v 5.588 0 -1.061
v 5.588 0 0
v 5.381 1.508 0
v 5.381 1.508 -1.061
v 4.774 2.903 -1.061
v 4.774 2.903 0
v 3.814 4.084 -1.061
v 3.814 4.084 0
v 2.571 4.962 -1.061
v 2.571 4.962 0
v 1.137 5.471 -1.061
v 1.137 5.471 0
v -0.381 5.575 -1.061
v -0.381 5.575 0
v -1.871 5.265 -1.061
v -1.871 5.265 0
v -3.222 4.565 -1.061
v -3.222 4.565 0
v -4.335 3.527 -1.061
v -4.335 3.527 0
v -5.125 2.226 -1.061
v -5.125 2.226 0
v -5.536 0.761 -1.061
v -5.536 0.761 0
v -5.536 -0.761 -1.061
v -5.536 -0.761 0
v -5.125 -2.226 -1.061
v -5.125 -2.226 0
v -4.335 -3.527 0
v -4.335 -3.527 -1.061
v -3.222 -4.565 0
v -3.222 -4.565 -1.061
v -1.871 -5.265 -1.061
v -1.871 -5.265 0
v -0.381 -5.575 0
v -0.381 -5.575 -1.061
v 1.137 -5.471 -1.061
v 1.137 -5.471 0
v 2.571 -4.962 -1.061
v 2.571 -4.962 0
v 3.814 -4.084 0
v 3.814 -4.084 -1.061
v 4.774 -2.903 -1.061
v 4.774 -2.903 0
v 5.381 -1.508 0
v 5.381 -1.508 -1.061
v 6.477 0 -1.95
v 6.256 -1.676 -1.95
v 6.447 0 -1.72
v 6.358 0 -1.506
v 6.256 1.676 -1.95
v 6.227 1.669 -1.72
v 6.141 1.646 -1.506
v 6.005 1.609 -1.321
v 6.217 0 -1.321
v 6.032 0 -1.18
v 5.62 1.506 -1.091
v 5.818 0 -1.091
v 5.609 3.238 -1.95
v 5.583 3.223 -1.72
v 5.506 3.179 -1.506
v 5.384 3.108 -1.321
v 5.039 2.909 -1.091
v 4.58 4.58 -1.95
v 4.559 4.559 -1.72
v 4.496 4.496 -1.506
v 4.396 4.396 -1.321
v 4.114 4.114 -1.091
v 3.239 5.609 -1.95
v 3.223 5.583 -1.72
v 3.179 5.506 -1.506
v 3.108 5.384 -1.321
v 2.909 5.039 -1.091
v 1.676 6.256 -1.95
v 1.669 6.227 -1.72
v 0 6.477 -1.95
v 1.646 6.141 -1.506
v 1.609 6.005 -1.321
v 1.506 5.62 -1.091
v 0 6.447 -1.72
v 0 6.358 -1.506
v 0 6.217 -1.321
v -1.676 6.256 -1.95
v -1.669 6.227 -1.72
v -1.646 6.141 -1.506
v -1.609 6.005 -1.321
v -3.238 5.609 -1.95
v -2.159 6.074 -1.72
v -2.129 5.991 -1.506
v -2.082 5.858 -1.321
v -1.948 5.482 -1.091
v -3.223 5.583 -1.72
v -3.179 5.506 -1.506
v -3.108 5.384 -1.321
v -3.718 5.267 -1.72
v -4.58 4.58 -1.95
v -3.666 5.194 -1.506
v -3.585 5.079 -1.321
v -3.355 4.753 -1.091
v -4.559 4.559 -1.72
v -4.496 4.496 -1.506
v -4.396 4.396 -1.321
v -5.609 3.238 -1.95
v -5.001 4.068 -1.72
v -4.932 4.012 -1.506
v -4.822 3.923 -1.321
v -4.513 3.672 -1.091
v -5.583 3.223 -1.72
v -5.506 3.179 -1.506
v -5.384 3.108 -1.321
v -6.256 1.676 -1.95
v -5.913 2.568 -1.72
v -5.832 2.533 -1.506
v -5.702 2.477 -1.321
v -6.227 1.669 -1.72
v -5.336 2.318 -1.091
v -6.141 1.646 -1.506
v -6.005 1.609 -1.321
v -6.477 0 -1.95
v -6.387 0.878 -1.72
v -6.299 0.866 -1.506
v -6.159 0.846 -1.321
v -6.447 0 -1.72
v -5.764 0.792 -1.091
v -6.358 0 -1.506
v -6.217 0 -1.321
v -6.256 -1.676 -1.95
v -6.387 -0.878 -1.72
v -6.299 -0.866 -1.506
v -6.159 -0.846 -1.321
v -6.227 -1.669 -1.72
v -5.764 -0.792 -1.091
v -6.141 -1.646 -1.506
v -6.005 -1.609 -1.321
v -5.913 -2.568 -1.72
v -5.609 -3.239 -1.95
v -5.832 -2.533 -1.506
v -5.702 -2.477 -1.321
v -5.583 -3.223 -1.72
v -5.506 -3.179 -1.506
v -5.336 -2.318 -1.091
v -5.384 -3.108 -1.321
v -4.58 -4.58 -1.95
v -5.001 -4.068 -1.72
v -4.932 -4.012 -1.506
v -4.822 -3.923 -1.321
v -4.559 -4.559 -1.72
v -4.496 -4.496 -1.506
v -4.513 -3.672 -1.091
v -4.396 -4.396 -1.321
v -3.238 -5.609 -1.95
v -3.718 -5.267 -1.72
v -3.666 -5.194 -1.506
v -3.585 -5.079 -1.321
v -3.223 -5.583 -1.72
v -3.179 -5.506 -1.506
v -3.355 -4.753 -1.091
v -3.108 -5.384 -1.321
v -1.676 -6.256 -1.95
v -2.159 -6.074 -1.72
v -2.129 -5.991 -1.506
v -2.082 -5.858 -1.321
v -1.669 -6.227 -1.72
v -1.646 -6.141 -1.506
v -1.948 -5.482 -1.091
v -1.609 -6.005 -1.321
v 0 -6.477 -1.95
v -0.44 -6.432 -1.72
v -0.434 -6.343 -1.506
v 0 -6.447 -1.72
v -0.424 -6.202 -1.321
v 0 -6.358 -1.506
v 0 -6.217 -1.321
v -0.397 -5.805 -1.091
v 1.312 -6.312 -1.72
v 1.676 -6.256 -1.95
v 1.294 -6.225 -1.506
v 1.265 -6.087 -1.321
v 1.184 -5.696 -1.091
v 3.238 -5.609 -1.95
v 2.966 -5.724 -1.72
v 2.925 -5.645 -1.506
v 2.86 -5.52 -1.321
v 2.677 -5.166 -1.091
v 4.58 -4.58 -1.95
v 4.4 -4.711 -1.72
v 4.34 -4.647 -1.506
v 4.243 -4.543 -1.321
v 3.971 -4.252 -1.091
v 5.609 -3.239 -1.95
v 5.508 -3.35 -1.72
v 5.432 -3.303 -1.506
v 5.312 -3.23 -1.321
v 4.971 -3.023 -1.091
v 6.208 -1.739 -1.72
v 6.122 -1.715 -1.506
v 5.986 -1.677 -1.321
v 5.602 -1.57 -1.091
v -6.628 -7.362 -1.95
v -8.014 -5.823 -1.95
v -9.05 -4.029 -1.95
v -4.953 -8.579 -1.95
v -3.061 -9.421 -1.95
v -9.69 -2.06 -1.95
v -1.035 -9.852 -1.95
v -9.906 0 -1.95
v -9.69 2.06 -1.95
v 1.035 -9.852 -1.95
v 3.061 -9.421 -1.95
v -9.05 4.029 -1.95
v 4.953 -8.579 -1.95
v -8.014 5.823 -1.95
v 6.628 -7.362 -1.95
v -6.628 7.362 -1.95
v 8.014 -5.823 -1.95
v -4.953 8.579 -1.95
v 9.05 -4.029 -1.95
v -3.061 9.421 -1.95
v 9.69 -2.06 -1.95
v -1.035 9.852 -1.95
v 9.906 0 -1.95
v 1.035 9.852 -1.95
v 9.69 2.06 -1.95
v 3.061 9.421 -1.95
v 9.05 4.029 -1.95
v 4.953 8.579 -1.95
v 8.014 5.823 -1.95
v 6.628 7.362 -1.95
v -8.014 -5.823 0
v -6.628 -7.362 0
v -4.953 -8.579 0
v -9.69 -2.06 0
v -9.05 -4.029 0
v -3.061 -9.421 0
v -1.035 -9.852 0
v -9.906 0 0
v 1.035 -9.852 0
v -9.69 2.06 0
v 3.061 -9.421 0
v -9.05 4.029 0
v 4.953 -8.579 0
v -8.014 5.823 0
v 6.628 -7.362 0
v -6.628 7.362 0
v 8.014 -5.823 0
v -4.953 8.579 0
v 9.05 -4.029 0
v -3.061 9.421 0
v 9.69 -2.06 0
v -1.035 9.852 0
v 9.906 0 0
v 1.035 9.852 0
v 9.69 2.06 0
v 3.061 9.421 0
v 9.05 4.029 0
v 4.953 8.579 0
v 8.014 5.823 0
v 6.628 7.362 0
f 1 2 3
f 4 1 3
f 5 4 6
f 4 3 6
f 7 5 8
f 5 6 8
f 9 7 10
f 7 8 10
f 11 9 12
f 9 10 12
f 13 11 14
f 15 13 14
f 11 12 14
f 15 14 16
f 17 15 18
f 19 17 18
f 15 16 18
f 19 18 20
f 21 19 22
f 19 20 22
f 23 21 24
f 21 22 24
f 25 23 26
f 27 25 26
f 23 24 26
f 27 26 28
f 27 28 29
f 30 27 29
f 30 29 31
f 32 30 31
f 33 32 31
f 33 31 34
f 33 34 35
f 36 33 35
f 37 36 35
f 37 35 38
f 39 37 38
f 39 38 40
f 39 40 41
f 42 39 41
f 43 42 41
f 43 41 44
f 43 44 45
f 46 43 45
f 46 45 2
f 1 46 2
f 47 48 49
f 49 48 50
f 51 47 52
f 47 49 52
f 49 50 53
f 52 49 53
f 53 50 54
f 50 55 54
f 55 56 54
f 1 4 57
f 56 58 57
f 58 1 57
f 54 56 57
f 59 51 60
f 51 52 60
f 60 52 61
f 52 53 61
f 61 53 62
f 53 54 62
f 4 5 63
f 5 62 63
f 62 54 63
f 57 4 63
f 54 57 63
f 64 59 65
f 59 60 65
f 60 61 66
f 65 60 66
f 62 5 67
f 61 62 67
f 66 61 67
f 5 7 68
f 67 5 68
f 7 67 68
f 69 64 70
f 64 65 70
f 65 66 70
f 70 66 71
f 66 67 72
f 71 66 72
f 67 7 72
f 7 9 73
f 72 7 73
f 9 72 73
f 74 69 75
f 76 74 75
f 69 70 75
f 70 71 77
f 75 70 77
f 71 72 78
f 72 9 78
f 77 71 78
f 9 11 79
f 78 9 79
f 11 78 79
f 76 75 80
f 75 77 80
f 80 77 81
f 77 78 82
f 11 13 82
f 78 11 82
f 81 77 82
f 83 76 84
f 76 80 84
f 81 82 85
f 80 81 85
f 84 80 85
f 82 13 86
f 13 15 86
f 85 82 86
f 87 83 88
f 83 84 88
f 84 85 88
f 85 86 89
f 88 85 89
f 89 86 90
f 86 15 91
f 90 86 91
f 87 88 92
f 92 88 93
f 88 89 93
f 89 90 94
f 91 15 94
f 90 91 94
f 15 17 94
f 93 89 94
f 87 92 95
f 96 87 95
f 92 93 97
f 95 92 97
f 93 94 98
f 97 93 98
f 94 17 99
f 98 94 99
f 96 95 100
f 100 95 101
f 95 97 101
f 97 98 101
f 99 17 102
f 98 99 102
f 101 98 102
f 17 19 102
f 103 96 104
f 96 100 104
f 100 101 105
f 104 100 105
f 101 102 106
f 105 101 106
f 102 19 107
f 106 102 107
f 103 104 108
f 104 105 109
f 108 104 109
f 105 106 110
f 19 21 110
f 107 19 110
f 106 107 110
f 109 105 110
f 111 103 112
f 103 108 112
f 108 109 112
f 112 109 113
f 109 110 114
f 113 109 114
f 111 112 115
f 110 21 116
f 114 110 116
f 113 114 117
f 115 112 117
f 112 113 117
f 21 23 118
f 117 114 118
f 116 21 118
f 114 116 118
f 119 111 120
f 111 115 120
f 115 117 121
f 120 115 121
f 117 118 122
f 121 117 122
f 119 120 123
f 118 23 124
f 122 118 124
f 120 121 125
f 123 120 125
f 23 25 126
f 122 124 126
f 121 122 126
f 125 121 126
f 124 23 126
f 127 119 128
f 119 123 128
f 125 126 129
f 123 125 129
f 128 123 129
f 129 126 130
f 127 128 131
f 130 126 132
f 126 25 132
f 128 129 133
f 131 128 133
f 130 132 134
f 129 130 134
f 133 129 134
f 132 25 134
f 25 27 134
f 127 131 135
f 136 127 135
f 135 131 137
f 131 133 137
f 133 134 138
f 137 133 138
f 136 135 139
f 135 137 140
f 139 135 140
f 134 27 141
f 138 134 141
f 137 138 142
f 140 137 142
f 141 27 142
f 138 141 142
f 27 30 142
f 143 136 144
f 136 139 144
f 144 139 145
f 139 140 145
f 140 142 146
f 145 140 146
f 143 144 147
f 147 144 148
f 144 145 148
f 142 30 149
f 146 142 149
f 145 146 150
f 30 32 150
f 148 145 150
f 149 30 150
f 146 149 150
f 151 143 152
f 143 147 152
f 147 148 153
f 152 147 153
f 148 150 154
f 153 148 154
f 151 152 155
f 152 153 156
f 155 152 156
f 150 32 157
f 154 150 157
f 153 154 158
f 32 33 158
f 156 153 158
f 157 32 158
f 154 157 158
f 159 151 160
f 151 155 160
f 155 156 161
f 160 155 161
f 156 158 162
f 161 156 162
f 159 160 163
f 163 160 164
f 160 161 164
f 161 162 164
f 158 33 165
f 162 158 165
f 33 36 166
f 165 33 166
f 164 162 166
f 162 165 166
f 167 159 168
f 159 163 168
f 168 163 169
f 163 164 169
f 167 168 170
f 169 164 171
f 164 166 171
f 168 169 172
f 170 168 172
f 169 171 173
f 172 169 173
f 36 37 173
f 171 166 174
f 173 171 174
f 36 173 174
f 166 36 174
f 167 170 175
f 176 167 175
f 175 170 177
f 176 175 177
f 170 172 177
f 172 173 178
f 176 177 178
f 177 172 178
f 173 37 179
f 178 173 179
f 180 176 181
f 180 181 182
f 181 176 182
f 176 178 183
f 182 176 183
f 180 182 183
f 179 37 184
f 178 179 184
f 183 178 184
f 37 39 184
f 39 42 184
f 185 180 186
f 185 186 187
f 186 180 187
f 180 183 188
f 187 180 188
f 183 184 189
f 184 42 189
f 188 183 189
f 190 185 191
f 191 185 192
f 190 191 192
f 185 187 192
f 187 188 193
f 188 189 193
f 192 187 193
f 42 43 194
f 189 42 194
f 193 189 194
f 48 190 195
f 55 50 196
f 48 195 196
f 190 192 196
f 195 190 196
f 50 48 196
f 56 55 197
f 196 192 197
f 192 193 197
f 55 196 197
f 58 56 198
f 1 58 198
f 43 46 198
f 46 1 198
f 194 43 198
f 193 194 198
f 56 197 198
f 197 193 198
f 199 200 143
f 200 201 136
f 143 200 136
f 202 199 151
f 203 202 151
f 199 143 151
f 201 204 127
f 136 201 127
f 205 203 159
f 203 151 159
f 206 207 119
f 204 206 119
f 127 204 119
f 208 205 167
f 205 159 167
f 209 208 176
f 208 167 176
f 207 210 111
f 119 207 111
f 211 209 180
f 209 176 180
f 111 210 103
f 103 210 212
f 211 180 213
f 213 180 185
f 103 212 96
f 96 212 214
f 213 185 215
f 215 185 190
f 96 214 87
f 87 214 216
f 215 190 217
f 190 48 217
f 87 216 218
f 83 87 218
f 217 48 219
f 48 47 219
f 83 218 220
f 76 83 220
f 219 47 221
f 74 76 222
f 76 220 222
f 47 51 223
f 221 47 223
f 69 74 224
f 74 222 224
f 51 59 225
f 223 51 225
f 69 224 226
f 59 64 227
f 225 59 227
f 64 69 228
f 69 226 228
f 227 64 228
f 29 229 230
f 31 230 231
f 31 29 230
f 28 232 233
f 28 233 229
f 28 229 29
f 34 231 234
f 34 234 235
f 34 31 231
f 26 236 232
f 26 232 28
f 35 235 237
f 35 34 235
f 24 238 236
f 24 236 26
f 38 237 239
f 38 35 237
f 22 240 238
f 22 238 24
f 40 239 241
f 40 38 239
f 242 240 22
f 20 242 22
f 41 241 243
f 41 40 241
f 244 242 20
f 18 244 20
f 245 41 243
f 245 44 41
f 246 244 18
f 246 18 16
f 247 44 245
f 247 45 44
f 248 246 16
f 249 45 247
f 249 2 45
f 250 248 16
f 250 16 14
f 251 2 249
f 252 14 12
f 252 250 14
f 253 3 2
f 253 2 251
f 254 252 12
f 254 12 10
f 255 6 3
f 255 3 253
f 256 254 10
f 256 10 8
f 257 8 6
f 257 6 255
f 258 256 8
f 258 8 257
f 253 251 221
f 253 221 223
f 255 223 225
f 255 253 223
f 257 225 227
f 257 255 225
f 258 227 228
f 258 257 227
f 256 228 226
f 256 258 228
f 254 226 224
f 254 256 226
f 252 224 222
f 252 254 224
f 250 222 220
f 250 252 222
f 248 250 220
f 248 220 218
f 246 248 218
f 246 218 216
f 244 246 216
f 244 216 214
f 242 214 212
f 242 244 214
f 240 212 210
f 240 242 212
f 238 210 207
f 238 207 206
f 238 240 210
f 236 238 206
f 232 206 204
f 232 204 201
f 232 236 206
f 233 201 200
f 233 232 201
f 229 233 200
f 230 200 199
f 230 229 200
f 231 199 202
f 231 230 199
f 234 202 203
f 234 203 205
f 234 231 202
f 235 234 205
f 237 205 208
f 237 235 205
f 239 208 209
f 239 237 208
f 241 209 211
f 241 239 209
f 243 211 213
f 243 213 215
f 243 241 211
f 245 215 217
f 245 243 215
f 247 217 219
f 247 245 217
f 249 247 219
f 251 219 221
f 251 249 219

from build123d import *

# Parameters (mm, degrees)
SKETCH1_R                  = 9.906
BOSS_EXTRUDE1_DEPTH        = 1.95
F_97_0_44_DIAMETER_HOLE1_D = 11.176


# Read off the part's stored shape, not the designer's step: Cut-Sweep1
with BuildPart() as part:
    # Sketch1 → Boss-Extrude1 (new body)
    with BuildSketch(Plane.XY):
        Circle(SKETCH1_R)
    extrude(amount=-BOSS_EXTRUDE1_DEPTH)

    # #97 (0.44) Diameter Hole1 (through all)
    with Locations(Plane(origin=(0, 0, -1.95), x_dir=(-1, 0, 0), z_dir=(0, 0, -1))):
        with Locations((0, 0)):
            Hole(F_97_0_44_DIAMETER_HOLE1_D / 2)

    # Cut-Sweep1 outline → Cut-Sweep1 (revolve, cut)
    with BuildSketch(Plane.XZ):
        with BuildLine():
            ThreePointArc((6.477, -1.95), (6.216617928, -1.321382072), (5.588, -1.061))
            Line((5.588, -1.061), (5.588, -1.95))
            Line((5.588, -1.95), (6.477, -1.95))
        make_face()
    revolve(axis=Axis((0, 0, 0), (0, 0, 1)), mode=Mode.SUBTRACT)


solid = part.part
